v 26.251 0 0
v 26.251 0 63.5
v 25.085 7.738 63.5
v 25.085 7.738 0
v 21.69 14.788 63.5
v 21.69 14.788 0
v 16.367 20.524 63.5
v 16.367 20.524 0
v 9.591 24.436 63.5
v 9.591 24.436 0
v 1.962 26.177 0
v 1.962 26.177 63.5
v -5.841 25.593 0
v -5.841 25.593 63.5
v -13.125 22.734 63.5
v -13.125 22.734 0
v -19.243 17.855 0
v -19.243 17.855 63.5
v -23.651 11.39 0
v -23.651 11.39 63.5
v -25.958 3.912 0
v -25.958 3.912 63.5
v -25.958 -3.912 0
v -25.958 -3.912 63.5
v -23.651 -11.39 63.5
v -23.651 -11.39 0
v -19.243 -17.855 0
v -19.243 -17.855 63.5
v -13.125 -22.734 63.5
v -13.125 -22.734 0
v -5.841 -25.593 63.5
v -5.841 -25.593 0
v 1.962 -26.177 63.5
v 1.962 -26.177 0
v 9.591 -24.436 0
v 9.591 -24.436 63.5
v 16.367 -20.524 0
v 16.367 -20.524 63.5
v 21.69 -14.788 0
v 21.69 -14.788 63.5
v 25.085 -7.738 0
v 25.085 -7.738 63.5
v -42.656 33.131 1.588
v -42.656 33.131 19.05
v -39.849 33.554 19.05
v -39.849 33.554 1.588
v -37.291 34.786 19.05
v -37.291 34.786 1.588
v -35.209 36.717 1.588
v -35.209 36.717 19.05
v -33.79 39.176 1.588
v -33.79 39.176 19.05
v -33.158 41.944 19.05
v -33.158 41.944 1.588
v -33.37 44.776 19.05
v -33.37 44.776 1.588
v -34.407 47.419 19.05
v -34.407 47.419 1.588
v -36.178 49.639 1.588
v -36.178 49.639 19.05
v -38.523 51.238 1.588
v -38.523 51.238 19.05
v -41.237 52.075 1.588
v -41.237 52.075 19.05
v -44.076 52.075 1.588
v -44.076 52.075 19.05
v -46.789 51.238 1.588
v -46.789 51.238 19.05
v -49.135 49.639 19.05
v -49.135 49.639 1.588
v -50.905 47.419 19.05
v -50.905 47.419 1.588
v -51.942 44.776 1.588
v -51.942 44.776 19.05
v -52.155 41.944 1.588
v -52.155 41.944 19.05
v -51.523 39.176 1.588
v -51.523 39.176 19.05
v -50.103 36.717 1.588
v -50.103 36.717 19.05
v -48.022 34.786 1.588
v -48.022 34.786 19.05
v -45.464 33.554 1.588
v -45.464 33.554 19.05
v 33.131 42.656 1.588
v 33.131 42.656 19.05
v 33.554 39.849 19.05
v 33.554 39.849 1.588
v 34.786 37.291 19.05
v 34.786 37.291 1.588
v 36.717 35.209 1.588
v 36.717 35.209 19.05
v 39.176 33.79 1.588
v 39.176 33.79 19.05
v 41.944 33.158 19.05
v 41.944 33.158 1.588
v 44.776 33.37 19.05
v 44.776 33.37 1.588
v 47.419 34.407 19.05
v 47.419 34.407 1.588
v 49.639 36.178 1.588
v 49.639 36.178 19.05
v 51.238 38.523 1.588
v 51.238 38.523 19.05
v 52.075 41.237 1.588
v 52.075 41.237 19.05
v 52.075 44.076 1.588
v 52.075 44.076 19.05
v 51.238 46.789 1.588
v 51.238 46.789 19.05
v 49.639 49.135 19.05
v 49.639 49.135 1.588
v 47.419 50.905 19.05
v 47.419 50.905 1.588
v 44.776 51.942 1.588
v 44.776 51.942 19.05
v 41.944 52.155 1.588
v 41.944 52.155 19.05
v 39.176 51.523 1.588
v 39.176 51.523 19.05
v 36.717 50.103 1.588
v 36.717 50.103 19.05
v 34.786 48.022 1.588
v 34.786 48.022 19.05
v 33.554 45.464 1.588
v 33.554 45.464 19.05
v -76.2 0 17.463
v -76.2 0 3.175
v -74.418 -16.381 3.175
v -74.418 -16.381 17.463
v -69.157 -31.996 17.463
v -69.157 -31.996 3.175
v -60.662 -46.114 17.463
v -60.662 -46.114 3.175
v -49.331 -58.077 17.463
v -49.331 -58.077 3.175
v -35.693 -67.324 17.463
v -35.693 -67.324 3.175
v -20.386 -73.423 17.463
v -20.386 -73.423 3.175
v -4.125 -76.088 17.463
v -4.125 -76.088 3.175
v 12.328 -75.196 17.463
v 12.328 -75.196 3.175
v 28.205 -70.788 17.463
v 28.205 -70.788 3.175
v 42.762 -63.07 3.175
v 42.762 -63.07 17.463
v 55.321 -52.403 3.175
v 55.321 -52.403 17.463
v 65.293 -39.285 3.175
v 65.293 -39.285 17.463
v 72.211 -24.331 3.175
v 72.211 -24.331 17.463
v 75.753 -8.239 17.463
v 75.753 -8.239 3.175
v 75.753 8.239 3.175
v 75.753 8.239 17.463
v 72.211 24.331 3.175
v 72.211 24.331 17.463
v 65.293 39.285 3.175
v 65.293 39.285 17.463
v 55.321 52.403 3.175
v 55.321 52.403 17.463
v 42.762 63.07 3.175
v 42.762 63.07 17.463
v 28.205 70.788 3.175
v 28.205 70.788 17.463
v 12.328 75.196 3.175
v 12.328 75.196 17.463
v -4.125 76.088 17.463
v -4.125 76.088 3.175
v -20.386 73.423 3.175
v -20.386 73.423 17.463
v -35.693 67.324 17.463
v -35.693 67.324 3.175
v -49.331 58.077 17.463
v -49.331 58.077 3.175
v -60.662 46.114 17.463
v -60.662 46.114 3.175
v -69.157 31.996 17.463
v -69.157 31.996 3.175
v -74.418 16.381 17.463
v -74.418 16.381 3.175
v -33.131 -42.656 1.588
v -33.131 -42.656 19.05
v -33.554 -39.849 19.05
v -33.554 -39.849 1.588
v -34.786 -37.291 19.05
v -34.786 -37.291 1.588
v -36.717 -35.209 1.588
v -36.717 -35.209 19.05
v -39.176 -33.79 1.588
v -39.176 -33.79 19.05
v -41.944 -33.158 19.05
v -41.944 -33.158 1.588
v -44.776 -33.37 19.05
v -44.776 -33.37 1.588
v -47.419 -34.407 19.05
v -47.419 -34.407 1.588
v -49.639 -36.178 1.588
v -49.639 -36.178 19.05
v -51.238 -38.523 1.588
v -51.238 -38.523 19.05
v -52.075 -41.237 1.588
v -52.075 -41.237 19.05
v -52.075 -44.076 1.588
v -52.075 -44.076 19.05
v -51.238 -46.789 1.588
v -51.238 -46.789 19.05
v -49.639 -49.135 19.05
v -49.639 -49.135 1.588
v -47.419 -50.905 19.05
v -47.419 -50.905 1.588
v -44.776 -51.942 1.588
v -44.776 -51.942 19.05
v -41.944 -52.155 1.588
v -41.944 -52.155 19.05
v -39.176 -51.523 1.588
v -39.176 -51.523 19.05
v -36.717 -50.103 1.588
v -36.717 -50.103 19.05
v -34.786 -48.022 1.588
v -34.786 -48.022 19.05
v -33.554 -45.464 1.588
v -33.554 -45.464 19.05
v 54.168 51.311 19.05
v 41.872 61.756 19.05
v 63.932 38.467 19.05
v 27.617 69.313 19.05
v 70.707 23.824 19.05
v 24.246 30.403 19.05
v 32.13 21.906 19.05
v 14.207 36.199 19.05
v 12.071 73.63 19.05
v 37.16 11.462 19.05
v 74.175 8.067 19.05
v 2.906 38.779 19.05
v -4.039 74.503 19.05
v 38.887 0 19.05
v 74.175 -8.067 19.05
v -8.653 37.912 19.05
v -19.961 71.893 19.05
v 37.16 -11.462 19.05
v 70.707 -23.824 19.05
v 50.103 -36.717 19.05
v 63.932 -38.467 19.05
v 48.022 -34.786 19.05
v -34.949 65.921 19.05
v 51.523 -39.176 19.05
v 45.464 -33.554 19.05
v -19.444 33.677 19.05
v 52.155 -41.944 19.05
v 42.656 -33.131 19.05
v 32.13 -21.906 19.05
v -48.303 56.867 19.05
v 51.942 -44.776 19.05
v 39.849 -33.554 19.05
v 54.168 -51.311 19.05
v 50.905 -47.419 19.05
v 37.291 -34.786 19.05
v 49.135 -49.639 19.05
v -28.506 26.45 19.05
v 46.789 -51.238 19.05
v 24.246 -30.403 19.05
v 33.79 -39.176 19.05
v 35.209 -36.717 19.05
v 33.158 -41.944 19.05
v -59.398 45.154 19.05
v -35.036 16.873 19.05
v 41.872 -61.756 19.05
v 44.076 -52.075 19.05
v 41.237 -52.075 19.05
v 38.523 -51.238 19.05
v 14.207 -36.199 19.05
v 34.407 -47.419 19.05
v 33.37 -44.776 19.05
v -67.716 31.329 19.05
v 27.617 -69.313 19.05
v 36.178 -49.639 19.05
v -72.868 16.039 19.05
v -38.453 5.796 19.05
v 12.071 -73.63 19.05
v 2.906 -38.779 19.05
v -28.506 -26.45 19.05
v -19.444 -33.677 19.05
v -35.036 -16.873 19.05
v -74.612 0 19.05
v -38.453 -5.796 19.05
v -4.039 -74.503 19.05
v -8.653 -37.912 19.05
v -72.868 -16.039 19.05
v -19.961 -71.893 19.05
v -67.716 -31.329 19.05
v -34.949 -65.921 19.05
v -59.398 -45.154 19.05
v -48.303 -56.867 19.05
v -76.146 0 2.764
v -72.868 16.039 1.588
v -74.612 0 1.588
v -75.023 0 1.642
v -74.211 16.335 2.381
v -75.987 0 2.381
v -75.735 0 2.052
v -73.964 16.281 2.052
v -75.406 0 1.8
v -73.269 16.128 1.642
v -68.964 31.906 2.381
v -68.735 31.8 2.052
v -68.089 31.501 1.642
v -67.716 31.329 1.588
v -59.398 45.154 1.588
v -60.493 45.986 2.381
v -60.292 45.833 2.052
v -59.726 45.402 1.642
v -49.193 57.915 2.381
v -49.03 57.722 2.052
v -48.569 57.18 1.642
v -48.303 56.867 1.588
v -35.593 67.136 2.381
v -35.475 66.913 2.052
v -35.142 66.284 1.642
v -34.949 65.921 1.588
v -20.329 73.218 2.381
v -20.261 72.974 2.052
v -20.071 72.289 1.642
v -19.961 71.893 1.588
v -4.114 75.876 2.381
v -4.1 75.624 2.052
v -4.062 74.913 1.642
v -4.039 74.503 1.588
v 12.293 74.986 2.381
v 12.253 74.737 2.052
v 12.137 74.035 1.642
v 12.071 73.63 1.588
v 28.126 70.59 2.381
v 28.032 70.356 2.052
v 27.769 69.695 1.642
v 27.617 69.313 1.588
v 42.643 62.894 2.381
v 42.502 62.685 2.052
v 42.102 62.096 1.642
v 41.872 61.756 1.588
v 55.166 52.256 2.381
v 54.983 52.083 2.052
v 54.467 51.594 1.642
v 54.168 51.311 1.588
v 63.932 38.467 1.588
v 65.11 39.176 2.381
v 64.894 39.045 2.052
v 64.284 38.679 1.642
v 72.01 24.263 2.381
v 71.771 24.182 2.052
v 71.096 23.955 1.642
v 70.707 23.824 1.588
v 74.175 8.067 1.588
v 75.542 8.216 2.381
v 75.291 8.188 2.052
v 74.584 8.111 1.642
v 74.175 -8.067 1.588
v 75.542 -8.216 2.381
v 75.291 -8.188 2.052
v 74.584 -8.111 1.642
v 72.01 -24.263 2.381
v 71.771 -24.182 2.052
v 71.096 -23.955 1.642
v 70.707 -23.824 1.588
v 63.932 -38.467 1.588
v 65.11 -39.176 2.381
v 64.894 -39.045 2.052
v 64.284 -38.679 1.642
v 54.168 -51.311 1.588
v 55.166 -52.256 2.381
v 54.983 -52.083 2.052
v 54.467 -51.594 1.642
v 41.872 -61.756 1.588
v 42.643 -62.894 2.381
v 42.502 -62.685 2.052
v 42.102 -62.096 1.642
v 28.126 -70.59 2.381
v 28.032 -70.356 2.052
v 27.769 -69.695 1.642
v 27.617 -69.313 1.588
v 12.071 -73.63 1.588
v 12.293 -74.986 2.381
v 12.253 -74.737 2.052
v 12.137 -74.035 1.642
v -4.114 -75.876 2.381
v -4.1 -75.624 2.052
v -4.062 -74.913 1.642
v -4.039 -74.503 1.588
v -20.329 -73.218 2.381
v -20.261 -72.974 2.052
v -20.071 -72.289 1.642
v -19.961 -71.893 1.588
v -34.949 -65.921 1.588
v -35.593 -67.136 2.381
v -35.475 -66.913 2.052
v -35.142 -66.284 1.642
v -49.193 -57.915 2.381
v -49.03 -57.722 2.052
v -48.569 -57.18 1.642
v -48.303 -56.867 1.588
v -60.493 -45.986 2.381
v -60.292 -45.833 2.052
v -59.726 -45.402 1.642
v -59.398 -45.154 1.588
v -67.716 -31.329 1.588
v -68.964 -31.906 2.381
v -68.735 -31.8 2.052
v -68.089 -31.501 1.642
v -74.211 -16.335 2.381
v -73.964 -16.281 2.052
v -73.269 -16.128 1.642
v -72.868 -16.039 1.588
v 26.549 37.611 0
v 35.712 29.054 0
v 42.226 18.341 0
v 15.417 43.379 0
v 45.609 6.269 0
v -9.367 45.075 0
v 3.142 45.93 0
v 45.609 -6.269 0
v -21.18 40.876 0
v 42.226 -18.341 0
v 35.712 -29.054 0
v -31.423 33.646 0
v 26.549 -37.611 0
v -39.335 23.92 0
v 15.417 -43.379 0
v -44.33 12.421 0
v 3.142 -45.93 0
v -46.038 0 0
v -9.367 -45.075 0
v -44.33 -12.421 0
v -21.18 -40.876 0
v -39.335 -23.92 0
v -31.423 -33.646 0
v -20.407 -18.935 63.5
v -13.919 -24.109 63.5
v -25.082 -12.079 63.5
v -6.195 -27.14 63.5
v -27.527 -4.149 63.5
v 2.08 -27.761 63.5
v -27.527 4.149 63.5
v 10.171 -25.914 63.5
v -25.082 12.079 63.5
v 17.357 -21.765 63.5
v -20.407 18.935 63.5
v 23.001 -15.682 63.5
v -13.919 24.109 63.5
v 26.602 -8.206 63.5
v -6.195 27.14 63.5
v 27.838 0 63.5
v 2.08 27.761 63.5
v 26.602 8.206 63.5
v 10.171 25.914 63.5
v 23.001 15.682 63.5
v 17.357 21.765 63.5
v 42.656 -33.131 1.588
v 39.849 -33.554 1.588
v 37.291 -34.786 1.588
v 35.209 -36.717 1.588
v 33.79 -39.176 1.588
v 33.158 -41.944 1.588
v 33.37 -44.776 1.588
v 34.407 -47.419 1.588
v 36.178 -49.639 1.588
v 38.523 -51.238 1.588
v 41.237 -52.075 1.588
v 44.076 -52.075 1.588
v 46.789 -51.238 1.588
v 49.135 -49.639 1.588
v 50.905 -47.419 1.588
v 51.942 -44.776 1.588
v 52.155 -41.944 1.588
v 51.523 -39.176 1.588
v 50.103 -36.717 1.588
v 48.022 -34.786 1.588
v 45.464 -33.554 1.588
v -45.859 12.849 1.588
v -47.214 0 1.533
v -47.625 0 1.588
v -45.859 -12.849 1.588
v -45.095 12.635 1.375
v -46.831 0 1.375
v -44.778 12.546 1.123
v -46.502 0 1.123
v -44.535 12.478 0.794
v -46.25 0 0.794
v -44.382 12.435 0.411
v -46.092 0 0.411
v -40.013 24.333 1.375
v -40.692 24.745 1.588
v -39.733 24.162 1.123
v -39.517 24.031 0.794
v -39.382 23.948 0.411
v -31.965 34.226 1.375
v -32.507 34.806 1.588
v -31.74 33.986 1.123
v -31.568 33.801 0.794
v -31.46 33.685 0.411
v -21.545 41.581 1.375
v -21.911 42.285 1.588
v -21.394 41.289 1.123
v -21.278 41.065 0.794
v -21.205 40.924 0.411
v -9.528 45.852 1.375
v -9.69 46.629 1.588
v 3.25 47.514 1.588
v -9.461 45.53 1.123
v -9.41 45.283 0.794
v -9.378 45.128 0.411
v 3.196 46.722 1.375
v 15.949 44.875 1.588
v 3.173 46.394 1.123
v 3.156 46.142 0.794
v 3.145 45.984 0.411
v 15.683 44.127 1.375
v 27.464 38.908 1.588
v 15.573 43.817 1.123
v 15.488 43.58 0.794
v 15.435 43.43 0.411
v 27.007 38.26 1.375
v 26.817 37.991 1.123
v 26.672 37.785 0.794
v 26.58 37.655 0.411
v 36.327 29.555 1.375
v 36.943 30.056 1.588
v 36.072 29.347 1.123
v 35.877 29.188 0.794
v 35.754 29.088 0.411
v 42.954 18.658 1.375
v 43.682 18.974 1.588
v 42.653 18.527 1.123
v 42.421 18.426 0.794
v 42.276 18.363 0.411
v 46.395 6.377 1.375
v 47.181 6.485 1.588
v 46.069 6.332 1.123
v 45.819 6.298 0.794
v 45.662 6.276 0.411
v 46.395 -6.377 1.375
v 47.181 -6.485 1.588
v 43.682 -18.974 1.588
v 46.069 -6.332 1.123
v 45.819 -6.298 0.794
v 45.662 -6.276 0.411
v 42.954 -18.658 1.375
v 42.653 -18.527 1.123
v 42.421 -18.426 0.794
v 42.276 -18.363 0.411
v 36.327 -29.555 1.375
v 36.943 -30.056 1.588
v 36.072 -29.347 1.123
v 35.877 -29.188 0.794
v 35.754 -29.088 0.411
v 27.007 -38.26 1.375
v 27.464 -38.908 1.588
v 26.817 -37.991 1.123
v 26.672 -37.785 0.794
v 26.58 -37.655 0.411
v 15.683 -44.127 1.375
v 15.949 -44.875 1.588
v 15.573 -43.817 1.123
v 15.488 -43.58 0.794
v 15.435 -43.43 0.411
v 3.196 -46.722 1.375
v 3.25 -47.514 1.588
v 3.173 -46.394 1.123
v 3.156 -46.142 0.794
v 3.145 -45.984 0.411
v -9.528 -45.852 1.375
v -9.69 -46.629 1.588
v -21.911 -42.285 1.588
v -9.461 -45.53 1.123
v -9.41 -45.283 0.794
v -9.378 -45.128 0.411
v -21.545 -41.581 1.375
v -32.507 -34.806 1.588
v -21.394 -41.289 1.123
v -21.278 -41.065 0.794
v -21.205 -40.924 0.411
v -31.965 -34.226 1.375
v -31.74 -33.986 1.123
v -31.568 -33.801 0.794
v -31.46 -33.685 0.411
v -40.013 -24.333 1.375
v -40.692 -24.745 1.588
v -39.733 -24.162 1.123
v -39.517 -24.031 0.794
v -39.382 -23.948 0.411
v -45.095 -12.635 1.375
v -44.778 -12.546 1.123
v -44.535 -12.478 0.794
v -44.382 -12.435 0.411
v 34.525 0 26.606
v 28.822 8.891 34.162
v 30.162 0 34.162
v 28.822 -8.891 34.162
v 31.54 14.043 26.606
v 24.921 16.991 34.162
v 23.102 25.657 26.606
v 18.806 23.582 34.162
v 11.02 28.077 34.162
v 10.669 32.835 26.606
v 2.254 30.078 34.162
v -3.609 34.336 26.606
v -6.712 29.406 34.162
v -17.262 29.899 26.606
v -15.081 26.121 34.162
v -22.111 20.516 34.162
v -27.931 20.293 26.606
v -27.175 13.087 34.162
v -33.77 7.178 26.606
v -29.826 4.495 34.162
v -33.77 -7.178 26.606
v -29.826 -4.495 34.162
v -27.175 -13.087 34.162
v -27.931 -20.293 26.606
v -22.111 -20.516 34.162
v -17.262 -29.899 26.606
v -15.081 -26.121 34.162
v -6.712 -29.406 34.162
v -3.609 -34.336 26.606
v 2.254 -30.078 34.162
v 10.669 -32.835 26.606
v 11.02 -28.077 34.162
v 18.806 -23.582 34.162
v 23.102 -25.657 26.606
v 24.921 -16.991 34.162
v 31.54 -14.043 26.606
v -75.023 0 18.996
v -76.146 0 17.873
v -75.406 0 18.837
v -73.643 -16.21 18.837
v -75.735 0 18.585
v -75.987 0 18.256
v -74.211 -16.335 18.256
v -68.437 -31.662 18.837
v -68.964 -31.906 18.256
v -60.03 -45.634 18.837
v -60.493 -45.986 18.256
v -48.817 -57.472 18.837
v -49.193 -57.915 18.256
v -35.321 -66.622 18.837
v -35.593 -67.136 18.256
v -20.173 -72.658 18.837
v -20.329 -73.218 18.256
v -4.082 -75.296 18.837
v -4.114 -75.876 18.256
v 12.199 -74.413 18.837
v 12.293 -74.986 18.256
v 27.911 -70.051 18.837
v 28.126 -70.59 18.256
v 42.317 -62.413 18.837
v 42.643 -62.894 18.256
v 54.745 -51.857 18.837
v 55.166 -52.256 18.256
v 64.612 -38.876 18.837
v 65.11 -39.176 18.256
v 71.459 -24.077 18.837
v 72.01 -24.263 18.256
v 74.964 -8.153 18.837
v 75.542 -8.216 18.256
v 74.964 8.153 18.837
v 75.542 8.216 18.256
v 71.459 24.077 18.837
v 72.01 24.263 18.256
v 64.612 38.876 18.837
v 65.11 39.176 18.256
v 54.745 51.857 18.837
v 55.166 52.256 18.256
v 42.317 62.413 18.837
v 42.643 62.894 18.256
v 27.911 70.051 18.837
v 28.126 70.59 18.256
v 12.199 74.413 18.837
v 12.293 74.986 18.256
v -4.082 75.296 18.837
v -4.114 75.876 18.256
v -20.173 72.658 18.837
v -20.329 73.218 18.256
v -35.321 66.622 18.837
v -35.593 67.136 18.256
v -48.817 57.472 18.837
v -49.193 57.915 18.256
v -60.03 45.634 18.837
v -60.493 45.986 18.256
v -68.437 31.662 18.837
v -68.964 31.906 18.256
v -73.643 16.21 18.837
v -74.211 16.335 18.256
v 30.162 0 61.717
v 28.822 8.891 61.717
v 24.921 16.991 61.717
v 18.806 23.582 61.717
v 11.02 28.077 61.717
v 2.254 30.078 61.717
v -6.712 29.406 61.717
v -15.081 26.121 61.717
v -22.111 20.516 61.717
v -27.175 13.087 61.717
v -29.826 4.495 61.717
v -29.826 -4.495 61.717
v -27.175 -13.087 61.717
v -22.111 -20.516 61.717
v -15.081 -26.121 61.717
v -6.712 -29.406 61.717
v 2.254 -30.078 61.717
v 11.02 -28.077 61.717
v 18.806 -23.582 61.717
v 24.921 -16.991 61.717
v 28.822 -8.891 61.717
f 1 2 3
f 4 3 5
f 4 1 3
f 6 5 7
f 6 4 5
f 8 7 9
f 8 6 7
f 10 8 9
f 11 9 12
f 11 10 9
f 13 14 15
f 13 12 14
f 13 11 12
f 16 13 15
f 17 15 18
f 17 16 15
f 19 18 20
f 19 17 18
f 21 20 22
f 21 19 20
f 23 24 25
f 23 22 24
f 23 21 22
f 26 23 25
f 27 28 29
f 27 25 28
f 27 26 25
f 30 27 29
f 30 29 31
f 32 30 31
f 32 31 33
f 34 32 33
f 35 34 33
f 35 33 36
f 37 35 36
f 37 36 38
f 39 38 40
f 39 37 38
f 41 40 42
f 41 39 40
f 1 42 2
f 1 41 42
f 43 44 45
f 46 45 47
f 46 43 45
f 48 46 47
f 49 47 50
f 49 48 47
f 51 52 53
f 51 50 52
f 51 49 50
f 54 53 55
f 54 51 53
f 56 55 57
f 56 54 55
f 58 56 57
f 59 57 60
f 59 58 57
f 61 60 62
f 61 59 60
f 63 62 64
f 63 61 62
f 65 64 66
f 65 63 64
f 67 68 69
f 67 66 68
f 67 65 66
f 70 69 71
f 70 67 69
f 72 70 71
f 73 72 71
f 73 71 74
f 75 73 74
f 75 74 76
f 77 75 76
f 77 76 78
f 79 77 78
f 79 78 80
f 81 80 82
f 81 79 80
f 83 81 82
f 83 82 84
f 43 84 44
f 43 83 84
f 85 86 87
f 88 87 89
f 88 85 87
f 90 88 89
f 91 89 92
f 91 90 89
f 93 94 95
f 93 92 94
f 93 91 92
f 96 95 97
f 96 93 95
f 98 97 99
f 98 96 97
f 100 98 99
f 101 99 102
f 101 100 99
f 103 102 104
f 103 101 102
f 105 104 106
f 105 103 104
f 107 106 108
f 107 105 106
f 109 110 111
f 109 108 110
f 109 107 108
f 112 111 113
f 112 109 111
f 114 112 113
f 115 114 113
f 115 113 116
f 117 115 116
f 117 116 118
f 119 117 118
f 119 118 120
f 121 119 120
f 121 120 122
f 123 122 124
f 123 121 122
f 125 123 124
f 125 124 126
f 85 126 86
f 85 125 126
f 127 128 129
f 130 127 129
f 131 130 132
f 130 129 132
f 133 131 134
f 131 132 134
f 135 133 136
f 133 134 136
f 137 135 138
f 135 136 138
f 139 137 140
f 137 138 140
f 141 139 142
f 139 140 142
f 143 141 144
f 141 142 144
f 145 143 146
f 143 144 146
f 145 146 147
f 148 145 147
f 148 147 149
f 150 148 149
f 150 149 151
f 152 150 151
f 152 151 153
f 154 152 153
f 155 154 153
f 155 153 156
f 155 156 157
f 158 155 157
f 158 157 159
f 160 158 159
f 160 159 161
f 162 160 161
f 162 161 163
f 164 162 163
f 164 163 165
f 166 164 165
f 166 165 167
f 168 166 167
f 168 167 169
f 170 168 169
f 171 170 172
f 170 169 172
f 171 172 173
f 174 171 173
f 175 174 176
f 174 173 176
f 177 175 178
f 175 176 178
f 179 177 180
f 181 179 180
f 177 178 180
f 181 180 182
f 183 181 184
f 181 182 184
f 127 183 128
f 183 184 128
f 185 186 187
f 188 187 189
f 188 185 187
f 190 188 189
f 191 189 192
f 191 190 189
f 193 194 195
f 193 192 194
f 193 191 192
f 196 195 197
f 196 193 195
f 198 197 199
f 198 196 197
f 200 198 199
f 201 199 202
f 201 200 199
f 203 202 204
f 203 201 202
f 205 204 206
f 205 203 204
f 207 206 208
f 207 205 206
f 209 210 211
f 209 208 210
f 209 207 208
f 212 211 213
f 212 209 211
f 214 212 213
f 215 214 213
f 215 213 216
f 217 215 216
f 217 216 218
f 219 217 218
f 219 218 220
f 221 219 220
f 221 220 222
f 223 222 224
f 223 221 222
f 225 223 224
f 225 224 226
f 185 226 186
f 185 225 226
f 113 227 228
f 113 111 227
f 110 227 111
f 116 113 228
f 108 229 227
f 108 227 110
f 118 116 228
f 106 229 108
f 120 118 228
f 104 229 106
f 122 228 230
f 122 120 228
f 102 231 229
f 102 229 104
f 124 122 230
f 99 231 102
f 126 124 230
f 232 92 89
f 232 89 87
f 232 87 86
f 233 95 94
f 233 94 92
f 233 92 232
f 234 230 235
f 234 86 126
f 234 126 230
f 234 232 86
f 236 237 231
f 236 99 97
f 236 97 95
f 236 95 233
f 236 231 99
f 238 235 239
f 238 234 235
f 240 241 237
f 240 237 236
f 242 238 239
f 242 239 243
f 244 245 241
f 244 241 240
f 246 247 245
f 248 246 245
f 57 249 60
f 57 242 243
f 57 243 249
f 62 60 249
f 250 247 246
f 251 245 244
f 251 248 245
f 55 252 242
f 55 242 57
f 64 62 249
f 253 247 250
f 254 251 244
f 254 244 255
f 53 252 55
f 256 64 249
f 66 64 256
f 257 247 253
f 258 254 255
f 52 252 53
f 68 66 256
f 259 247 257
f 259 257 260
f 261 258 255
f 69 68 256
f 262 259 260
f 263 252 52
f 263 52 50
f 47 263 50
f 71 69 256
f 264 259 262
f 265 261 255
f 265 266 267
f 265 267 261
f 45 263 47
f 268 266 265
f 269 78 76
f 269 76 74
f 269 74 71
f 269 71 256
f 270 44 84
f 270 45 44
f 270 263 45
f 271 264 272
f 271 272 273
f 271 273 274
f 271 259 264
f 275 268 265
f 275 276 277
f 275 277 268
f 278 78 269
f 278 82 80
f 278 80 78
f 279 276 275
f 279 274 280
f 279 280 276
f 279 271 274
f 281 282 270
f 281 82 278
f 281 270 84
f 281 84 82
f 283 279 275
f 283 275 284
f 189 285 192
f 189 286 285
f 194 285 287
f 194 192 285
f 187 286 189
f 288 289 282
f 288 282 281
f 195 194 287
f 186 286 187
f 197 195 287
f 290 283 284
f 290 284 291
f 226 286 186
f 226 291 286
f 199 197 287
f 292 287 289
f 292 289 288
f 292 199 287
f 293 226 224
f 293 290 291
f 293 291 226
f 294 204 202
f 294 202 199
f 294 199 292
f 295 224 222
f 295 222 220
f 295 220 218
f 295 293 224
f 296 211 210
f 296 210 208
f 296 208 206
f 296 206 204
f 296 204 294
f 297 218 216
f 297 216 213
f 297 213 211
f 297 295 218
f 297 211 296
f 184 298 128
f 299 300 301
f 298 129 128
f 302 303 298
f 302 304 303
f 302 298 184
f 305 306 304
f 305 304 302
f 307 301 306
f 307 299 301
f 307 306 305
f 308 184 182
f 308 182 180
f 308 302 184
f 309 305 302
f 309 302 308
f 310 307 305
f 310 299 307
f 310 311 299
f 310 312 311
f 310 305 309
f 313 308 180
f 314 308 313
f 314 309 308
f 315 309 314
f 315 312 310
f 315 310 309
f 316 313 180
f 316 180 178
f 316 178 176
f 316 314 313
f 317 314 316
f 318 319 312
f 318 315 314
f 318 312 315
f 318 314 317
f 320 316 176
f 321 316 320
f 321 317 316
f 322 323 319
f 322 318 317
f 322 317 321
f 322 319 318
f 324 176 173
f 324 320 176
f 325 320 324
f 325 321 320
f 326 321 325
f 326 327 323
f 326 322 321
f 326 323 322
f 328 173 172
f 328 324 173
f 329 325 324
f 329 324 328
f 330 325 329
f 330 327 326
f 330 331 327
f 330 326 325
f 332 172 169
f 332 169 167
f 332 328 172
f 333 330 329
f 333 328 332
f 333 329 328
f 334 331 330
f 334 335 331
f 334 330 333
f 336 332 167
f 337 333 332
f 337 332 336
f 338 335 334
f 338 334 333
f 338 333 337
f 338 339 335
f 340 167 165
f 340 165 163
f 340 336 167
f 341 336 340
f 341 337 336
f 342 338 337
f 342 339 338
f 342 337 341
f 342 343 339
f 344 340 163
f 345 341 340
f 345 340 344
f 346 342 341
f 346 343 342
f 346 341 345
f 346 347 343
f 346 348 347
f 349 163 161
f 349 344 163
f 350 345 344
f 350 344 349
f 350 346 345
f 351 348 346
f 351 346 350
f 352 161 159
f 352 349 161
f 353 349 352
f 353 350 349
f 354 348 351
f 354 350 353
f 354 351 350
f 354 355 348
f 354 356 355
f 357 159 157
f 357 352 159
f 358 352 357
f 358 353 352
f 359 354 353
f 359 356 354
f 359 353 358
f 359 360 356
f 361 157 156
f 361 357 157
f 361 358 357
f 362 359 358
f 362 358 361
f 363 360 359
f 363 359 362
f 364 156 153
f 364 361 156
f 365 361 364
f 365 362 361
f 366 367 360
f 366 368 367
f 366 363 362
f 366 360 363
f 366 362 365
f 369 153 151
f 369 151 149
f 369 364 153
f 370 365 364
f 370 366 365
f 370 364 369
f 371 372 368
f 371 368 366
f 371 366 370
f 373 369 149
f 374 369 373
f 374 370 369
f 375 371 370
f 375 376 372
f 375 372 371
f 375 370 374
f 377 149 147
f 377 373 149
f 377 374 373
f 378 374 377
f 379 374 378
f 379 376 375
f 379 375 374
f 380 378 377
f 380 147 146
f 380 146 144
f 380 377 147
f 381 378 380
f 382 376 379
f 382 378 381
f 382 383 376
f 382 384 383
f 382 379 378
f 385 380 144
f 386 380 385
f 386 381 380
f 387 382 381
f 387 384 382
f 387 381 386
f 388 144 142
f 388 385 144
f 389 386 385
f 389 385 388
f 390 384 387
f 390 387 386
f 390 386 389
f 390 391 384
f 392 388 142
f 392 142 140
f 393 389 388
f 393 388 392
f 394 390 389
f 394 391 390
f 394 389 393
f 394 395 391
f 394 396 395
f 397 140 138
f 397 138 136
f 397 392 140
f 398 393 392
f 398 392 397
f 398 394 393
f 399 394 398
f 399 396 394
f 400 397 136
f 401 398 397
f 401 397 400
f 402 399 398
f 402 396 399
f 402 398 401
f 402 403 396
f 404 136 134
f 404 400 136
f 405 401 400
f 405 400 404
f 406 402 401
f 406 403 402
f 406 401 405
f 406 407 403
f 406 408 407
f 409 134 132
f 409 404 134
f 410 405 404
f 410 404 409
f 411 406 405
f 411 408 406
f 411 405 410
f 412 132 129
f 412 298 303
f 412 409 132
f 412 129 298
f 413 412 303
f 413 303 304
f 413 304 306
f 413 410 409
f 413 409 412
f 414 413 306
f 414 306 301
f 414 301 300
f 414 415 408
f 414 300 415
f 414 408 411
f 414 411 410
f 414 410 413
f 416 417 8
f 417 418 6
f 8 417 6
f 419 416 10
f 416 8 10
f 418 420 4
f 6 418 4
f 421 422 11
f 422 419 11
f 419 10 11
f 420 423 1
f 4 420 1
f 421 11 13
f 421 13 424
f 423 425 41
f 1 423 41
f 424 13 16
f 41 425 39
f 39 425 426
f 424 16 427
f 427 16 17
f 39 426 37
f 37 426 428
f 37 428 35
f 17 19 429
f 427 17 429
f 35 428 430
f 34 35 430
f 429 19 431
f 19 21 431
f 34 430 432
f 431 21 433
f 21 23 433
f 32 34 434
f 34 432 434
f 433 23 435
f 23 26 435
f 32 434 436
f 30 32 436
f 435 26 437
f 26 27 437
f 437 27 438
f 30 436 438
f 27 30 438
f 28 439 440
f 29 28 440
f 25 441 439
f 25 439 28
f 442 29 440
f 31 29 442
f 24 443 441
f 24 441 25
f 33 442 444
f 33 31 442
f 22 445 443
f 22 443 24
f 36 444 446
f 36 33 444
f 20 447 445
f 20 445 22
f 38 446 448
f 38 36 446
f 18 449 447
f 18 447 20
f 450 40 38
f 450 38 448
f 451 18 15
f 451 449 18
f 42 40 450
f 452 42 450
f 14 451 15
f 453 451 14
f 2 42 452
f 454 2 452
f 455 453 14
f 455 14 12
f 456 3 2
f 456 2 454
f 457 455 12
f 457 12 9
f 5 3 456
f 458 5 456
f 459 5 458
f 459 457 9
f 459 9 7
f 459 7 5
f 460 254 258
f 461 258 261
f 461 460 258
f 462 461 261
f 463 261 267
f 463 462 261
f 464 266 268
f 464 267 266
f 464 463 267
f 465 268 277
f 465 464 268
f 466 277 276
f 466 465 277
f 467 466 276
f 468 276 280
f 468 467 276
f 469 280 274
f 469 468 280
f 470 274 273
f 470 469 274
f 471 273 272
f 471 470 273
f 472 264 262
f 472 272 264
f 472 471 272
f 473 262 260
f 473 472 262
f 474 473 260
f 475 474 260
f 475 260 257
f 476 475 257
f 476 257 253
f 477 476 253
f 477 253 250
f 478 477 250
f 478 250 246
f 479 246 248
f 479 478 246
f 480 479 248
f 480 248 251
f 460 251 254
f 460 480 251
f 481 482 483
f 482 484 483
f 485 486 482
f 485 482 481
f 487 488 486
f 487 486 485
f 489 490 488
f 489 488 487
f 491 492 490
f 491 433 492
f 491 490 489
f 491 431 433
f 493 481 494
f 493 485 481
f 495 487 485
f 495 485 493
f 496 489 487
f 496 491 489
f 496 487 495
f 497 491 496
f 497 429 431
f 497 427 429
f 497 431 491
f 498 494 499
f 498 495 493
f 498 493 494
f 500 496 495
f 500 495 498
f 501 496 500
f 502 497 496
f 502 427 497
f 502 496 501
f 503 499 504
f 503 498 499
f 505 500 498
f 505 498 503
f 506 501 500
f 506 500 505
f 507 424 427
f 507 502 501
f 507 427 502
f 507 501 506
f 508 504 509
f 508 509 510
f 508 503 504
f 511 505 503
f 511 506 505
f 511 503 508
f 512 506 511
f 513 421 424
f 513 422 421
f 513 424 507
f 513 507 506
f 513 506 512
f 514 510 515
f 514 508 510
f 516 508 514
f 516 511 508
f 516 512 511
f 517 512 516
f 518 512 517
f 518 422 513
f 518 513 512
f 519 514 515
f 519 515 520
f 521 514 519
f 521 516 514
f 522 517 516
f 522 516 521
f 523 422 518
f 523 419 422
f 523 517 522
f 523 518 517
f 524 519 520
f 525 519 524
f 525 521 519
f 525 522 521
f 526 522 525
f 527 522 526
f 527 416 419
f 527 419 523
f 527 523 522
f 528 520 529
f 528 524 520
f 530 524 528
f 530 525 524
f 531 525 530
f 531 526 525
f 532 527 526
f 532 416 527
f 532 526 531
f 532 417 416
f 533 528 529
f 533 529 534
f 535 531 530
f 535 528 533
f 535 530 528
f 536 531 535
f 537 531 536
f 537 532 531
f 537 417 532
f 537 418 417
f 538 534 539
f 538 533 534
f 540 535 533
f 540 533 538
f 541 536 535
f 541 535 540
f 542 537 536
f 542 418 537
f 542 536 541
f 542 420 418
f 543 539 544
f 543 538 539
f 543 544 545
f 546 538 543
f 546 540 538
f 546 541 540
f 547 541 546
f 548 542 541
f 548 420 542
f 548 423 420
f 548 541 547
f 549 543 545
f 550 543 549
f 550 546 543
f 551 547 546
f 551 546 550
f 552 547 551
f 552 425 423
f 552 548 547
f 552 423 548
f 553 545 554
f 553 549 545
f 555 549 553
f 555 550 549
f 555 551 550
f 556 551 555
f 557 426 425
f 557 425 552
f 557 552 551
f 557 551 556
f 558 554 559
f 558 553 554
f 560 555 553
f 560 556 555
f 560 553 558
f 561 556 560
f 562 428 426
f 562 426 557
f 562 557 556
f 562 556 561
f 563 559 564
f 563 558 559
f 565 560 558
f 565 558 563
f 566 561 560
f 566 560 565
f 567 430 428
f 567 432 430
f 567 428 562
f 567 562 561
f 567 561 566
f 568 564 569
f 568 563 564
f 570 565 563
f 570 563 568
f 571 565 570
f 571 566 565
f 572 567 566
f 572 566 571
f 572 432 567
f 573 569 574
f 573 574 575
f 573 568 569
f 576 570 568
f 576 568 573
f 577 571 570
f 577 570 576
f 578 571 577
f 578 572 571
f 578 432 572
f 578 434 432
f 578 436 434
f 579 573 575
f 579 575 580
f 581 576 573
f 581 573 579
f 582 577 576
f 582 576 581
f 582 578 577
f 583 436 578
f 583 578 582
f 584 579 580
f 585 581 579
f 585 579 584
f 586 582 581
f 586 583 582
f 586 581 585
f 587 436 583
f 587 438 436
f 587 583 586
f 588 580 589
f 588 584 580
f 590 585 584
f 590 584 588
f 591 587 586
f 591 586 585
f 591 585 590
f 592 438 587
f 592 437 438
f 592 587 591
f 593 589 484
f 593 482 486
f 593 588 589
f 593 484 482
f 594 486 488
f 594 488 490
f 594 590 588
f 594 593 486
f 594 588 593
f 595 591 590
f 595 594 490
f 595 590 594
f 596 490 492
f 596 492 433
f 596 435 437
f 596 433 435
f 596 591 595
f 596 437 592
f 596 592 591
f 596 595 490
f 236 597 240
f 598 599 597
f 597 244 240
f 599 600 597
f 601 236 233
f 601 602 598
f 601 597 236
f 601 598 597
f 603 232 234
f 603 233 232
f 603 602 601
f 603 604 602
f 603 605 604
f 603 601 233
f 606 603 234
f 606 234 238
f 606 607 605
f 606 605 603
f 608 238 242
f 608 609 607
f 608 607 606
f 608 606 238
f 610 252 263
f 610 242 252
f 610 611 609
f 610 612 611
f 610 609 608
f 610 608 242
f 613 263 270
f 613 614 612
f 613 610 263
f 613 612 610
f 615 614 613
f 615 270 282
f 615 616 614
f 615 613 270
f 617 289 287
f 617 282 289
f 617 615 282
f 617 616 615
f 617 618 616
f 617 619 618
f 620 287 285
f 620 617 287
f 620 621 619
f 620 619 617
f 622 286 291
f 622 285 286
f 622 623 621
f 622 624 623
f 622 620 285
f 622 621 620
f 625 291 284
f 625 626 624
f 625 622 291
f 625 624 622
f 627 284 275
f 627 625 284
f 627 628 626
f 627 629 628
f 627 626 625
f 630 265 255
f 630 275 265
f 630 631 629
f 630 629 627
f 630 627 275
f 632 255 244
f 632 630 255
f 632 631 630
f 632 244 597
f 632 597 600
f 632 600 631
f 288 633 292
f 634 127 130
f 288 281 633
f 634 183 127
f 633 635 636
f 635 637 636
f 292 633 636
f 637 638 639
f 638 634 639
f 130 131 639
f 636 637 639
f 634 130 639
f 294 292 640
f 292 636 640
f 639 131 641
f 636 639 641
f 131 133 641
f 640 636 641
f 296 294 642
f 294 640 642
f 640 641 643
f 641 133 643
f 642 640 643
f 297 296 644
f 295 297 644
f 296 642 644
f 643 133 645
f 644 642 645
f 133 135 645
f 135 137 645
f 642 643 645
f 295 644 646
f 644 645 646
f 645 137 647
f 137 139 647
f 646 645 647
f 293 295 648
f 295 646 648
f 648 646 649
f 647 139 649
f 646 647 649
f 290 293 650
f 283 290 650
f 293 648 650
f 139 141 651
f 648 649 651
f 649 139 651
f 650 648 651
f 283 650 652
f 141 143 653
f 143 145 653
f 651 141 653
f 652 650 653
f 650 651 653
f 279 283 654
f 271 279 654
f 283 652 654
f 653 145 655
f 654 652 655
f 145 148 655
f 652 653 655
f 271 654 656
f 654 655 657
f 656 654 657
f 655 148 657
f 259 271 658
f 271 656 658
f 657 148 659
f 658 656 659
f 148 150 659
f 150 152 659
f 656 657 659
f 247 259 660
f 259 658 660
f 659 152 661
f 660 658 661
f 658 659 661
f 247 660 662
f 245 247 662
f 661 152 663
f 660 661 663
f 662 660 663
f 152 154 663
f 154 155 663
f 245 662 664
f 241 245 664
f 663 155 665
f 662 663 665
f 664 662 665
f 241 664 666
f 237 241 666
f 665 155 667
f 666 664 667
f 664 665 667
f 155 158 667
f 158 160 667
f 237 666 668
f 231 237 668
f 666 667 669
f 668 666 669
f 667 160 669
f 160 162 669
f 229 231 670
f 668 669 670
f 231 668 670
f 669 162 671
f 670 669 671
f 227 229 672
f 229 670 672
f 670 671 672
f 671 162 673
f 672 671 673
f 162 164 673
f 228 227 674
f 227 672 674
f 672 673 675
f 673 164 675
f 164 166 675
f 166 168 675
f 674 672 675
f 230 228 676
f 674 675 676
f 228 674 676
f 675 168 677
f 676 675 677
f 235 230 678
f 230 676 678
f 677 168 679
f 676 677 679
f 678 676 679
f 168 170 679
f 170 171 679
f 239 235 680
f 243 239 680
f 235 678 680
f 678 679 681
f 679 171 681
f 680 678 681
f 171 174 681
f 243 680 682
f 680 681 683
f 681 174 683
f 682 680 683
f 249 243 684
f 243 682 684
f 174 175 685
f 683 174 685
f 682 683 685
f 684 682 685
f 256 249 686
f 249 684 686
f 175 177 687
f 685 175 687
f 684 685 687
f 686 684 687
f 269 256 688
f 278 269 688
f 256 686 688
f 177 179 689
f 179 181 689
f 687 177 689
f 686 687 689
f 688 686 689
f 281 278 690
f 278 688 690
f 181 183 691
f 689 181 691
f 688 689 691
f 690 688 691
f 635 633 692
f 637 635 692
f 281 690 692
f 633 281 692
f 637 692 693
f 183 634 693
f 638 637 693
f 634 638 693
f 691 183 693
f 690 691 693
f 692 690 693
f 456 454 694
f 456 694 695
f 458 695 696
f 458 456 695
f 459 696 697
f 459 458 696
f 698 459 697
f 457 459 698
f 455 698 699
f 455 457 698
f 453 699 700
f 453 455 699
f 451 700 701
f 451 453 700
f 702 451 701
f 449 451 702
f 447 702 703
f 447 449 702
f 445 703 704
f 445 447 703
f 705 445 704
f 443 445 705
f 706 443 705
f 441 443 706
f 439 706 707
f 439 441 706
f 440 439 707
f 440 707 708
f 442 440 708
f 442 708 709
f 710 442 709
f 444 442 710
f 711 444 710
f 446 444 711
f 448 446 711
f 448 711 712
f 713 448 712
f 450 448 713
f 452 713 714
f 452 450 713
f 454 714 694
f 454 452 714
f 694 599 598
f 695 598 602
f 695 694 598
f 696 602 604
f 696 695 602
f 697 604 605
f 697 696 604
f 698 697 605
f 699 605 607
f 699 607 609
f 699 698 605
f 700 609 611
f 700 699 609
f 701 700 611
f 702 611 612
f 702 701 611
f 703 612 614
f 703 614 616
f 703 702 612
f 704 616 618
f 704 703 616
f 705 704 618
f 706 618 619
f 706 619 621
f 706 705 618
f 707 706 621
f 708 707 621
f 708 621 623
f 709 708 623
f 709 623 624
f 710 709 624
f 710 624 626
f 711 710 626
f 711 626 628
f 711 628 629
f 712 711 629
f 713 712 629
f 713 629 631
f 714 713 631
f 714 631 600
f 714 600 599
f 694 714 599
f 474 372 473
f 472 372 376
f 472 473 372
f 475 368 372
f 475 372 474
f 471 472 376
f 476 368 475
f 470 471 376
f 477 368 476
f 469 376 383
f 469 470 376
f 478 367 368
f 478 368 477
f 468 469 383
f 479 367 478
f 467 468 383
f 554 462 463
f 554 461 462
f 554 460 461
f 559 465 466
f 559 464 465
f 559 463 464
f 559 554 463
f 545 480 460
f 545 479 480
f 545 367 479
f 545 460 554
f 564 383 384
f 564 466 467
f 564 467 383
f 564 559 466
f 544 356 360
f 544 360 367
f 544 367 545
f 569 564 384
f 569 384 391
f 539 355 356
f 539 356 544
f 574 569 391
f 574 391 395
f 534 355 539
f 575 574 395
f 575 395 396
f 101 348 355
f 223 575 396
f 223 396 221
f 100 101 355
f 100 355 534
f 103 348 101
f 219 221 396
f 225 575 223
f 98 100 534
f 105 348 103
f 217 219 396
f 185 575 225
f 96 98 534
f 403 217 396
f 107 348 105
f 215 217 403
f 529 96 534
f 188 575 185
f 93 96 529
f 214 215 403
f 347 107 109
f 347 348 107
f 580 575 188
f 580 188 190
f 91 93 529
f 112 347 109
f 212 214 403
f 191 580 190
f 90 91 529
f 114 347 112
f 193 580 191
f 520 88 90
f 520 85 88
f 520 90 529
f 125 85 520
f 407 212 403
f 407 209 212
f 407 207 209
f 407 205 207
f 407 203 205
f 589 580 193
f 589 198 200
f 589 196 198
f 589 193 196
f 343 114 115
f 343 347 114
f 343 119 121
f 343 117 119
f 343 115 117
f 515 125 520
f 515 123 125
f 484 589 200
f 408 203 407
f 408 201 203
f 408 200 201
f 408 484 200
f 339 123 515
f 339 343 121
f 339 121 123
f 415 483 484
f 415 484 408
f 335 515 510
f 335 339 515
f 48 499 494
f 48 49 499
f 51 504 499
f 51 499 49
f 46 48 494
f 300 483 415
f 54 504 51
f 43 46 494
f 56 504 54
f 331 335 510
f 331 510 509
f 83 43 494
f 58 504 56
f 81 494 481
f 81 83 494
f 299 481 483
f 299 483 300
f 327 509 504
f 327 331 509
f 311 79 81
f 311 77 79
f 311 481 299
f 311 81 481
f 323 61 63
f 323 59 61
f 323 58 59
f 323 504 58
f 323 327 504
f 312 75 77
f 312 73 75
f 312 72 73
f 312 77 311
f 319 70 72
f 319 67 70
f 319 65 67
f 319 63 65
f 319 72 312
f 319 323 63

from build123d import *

# Parameters (mm, degrees)
SKETCH1_R                 = 76.2
BOSS_EXTRUDE1_DEPTH       = 19.05
SKETCH2_R                 = 9.525
BOLTHOLE_DEPTH            = 110.433918417
BOLTHOLEPATTERN_COUNT     = 4
SKETCH5_OUTSIDE_W         = 197.674
SKETCH5_OUTSIDE_H         = 197.674
SKETCH5_OUTSIDE_R         = 46.0375
RAISED_FACE_DEPTH         = 1.5875
SKETCH8_R                 = 38.8874
WELD_NECK_120_DRAFT_DEPTH = 44.45
WELD_NECK_120_DRAFT_TAPER = 30
WELD_NECK_END_REACH       = 127.08
SKETCH9_R                 = 30.1625
WELD_NECK_CHAMFER1_SIZE   = 1.783344653
WELD_NECK_CHAMFER1_SIZE2  = 2.3241
SKETCH7_R                 = 26.2509
BORE_DEPTH                = 126.080494083
FILLET2_R                 = 1.5875
FILLET3_R                 = 1.5875


with BuildPart() as part:
    # Sketch1 → Boss-Extrude1 (new body)
    with BuildSketch(Plane.XY):
        with Locations(Location((0, 0, 0), (0, 0, 180))):
            Circle(SKETCH1_R)
    extrude(amount=BOSS_EXTRUDE1_DEPTH)

    # Sketch2 → BoltHole (cut, through all)
    with BuildSketch(Plane.XY):
        with Locations(Location((42.656216575, 42.656216575, 0), (0, 0, 180))):
            Circle(SKETCH2_R)
    bolthole = extrude(amount=BOLTHOLE_DEPTH, mode=Mode.SUBTRACT)

    # BoltHolePattern: BoltHole ×4 about axis
    boltholepattern_axis = Axis((0, 0, 0), (0, 0, 1))
    for i in range(1, BOLTHOLEPATTERN_COUNT):
        add(bolthole.rotate(boltholepattern_axis, i * 360 / BOLTHOLEPATTERN_COUNT), mode=Mode.SUBTRACT)

    # Sketch5 outside → Raised Face (cut)
    with BuildSketch(Plane(origin=(0, 0, 0), x_dir=(-1, 0, 0), z_dir=(0, 0, -1))):
        Rectangle(SKETCH5_OUTSIDE_W, SKETCH5_OUTSIDE_H)
        Circle(SKETCH5_OUTSIDE_R, mode=Mode.SUBTRACT)
    extrude(amount=-RAISED_FACE_DEPTH, mode=Mode.SUBTRACT)

    # Sketch8 → Weld Neck 120 Draft (add)
    with BuildSketch(Plane.XY.offset(19.05)):
        Circle(SKETCH8_R)
    extrude(amount=WELD_NECK_120_DRAFT_DEPTH, taper=WELD_NECK_120_DRAFT_TAPER)

    # Sketch9 → Weld Neck End (add, up to next)
    with BuildSketch(Plane.XY.offset(63.5), mode=Mode.PRIVATE) as weld_neck_end_sk1:
        Circle(SKETCH9_R)
    weld_neck_end_tool1 = extrude(weld_neck_end_sk1.sketch, amount=-WELD_NECK_END_REACH, mode=Mode.PRIVATE) - part.part
    add(weld_neck_end_tool1.solids().sort_by_distance((0, 0, 63.5))[0])

    # Weld Neck Chamfer1
    weld_neck_chamfer1_edges = [part.edges().sort_by_distance(p)[0] for p in [
        (-30.1625, 0, 63.5),
    ]]
    weld_neck_chamfer1_side = [part.faces().sort_by_distance(p)[0] for p in [
        (-30.1625, 0, 48.830985045),
    ]]
    chamfer(weld_neck_chamfer1_edges, length=WELD_NECK_CHAMFER1_SIZE, length2=WELD_NECK_CHAMFER1_SIZE2, reference=weld_neck_chamfer1_side[0])

    # Sketch7 → Bore (cut, through all)
    with BuildSketch(Plane.XY):
        Circle(SKETCH7_R)
    extrude(amount=BORE_DEPTH, mode=Mode.SUBTRACT)

    # Fillet2
    fillet2_edges = [part.edges().sort_by_distance(p)[0] for p in [
        (76.2, 0, 1.5875),
        (76.2, 0, 19.05),
    ]]
    fillet(fillet2_edges, radius=FILLET2_R)

    # Fillet3
    fillet3_edges = [part.edges().sort_by_distance(p)[0] for p in [
        (46.0375, 0, 1.5875),
    ]]
    fillet(fillet3_edges, radius=FILLET3_R - 0.0001)  # a hair under: the kernel refuses the full size


solid = part.part
